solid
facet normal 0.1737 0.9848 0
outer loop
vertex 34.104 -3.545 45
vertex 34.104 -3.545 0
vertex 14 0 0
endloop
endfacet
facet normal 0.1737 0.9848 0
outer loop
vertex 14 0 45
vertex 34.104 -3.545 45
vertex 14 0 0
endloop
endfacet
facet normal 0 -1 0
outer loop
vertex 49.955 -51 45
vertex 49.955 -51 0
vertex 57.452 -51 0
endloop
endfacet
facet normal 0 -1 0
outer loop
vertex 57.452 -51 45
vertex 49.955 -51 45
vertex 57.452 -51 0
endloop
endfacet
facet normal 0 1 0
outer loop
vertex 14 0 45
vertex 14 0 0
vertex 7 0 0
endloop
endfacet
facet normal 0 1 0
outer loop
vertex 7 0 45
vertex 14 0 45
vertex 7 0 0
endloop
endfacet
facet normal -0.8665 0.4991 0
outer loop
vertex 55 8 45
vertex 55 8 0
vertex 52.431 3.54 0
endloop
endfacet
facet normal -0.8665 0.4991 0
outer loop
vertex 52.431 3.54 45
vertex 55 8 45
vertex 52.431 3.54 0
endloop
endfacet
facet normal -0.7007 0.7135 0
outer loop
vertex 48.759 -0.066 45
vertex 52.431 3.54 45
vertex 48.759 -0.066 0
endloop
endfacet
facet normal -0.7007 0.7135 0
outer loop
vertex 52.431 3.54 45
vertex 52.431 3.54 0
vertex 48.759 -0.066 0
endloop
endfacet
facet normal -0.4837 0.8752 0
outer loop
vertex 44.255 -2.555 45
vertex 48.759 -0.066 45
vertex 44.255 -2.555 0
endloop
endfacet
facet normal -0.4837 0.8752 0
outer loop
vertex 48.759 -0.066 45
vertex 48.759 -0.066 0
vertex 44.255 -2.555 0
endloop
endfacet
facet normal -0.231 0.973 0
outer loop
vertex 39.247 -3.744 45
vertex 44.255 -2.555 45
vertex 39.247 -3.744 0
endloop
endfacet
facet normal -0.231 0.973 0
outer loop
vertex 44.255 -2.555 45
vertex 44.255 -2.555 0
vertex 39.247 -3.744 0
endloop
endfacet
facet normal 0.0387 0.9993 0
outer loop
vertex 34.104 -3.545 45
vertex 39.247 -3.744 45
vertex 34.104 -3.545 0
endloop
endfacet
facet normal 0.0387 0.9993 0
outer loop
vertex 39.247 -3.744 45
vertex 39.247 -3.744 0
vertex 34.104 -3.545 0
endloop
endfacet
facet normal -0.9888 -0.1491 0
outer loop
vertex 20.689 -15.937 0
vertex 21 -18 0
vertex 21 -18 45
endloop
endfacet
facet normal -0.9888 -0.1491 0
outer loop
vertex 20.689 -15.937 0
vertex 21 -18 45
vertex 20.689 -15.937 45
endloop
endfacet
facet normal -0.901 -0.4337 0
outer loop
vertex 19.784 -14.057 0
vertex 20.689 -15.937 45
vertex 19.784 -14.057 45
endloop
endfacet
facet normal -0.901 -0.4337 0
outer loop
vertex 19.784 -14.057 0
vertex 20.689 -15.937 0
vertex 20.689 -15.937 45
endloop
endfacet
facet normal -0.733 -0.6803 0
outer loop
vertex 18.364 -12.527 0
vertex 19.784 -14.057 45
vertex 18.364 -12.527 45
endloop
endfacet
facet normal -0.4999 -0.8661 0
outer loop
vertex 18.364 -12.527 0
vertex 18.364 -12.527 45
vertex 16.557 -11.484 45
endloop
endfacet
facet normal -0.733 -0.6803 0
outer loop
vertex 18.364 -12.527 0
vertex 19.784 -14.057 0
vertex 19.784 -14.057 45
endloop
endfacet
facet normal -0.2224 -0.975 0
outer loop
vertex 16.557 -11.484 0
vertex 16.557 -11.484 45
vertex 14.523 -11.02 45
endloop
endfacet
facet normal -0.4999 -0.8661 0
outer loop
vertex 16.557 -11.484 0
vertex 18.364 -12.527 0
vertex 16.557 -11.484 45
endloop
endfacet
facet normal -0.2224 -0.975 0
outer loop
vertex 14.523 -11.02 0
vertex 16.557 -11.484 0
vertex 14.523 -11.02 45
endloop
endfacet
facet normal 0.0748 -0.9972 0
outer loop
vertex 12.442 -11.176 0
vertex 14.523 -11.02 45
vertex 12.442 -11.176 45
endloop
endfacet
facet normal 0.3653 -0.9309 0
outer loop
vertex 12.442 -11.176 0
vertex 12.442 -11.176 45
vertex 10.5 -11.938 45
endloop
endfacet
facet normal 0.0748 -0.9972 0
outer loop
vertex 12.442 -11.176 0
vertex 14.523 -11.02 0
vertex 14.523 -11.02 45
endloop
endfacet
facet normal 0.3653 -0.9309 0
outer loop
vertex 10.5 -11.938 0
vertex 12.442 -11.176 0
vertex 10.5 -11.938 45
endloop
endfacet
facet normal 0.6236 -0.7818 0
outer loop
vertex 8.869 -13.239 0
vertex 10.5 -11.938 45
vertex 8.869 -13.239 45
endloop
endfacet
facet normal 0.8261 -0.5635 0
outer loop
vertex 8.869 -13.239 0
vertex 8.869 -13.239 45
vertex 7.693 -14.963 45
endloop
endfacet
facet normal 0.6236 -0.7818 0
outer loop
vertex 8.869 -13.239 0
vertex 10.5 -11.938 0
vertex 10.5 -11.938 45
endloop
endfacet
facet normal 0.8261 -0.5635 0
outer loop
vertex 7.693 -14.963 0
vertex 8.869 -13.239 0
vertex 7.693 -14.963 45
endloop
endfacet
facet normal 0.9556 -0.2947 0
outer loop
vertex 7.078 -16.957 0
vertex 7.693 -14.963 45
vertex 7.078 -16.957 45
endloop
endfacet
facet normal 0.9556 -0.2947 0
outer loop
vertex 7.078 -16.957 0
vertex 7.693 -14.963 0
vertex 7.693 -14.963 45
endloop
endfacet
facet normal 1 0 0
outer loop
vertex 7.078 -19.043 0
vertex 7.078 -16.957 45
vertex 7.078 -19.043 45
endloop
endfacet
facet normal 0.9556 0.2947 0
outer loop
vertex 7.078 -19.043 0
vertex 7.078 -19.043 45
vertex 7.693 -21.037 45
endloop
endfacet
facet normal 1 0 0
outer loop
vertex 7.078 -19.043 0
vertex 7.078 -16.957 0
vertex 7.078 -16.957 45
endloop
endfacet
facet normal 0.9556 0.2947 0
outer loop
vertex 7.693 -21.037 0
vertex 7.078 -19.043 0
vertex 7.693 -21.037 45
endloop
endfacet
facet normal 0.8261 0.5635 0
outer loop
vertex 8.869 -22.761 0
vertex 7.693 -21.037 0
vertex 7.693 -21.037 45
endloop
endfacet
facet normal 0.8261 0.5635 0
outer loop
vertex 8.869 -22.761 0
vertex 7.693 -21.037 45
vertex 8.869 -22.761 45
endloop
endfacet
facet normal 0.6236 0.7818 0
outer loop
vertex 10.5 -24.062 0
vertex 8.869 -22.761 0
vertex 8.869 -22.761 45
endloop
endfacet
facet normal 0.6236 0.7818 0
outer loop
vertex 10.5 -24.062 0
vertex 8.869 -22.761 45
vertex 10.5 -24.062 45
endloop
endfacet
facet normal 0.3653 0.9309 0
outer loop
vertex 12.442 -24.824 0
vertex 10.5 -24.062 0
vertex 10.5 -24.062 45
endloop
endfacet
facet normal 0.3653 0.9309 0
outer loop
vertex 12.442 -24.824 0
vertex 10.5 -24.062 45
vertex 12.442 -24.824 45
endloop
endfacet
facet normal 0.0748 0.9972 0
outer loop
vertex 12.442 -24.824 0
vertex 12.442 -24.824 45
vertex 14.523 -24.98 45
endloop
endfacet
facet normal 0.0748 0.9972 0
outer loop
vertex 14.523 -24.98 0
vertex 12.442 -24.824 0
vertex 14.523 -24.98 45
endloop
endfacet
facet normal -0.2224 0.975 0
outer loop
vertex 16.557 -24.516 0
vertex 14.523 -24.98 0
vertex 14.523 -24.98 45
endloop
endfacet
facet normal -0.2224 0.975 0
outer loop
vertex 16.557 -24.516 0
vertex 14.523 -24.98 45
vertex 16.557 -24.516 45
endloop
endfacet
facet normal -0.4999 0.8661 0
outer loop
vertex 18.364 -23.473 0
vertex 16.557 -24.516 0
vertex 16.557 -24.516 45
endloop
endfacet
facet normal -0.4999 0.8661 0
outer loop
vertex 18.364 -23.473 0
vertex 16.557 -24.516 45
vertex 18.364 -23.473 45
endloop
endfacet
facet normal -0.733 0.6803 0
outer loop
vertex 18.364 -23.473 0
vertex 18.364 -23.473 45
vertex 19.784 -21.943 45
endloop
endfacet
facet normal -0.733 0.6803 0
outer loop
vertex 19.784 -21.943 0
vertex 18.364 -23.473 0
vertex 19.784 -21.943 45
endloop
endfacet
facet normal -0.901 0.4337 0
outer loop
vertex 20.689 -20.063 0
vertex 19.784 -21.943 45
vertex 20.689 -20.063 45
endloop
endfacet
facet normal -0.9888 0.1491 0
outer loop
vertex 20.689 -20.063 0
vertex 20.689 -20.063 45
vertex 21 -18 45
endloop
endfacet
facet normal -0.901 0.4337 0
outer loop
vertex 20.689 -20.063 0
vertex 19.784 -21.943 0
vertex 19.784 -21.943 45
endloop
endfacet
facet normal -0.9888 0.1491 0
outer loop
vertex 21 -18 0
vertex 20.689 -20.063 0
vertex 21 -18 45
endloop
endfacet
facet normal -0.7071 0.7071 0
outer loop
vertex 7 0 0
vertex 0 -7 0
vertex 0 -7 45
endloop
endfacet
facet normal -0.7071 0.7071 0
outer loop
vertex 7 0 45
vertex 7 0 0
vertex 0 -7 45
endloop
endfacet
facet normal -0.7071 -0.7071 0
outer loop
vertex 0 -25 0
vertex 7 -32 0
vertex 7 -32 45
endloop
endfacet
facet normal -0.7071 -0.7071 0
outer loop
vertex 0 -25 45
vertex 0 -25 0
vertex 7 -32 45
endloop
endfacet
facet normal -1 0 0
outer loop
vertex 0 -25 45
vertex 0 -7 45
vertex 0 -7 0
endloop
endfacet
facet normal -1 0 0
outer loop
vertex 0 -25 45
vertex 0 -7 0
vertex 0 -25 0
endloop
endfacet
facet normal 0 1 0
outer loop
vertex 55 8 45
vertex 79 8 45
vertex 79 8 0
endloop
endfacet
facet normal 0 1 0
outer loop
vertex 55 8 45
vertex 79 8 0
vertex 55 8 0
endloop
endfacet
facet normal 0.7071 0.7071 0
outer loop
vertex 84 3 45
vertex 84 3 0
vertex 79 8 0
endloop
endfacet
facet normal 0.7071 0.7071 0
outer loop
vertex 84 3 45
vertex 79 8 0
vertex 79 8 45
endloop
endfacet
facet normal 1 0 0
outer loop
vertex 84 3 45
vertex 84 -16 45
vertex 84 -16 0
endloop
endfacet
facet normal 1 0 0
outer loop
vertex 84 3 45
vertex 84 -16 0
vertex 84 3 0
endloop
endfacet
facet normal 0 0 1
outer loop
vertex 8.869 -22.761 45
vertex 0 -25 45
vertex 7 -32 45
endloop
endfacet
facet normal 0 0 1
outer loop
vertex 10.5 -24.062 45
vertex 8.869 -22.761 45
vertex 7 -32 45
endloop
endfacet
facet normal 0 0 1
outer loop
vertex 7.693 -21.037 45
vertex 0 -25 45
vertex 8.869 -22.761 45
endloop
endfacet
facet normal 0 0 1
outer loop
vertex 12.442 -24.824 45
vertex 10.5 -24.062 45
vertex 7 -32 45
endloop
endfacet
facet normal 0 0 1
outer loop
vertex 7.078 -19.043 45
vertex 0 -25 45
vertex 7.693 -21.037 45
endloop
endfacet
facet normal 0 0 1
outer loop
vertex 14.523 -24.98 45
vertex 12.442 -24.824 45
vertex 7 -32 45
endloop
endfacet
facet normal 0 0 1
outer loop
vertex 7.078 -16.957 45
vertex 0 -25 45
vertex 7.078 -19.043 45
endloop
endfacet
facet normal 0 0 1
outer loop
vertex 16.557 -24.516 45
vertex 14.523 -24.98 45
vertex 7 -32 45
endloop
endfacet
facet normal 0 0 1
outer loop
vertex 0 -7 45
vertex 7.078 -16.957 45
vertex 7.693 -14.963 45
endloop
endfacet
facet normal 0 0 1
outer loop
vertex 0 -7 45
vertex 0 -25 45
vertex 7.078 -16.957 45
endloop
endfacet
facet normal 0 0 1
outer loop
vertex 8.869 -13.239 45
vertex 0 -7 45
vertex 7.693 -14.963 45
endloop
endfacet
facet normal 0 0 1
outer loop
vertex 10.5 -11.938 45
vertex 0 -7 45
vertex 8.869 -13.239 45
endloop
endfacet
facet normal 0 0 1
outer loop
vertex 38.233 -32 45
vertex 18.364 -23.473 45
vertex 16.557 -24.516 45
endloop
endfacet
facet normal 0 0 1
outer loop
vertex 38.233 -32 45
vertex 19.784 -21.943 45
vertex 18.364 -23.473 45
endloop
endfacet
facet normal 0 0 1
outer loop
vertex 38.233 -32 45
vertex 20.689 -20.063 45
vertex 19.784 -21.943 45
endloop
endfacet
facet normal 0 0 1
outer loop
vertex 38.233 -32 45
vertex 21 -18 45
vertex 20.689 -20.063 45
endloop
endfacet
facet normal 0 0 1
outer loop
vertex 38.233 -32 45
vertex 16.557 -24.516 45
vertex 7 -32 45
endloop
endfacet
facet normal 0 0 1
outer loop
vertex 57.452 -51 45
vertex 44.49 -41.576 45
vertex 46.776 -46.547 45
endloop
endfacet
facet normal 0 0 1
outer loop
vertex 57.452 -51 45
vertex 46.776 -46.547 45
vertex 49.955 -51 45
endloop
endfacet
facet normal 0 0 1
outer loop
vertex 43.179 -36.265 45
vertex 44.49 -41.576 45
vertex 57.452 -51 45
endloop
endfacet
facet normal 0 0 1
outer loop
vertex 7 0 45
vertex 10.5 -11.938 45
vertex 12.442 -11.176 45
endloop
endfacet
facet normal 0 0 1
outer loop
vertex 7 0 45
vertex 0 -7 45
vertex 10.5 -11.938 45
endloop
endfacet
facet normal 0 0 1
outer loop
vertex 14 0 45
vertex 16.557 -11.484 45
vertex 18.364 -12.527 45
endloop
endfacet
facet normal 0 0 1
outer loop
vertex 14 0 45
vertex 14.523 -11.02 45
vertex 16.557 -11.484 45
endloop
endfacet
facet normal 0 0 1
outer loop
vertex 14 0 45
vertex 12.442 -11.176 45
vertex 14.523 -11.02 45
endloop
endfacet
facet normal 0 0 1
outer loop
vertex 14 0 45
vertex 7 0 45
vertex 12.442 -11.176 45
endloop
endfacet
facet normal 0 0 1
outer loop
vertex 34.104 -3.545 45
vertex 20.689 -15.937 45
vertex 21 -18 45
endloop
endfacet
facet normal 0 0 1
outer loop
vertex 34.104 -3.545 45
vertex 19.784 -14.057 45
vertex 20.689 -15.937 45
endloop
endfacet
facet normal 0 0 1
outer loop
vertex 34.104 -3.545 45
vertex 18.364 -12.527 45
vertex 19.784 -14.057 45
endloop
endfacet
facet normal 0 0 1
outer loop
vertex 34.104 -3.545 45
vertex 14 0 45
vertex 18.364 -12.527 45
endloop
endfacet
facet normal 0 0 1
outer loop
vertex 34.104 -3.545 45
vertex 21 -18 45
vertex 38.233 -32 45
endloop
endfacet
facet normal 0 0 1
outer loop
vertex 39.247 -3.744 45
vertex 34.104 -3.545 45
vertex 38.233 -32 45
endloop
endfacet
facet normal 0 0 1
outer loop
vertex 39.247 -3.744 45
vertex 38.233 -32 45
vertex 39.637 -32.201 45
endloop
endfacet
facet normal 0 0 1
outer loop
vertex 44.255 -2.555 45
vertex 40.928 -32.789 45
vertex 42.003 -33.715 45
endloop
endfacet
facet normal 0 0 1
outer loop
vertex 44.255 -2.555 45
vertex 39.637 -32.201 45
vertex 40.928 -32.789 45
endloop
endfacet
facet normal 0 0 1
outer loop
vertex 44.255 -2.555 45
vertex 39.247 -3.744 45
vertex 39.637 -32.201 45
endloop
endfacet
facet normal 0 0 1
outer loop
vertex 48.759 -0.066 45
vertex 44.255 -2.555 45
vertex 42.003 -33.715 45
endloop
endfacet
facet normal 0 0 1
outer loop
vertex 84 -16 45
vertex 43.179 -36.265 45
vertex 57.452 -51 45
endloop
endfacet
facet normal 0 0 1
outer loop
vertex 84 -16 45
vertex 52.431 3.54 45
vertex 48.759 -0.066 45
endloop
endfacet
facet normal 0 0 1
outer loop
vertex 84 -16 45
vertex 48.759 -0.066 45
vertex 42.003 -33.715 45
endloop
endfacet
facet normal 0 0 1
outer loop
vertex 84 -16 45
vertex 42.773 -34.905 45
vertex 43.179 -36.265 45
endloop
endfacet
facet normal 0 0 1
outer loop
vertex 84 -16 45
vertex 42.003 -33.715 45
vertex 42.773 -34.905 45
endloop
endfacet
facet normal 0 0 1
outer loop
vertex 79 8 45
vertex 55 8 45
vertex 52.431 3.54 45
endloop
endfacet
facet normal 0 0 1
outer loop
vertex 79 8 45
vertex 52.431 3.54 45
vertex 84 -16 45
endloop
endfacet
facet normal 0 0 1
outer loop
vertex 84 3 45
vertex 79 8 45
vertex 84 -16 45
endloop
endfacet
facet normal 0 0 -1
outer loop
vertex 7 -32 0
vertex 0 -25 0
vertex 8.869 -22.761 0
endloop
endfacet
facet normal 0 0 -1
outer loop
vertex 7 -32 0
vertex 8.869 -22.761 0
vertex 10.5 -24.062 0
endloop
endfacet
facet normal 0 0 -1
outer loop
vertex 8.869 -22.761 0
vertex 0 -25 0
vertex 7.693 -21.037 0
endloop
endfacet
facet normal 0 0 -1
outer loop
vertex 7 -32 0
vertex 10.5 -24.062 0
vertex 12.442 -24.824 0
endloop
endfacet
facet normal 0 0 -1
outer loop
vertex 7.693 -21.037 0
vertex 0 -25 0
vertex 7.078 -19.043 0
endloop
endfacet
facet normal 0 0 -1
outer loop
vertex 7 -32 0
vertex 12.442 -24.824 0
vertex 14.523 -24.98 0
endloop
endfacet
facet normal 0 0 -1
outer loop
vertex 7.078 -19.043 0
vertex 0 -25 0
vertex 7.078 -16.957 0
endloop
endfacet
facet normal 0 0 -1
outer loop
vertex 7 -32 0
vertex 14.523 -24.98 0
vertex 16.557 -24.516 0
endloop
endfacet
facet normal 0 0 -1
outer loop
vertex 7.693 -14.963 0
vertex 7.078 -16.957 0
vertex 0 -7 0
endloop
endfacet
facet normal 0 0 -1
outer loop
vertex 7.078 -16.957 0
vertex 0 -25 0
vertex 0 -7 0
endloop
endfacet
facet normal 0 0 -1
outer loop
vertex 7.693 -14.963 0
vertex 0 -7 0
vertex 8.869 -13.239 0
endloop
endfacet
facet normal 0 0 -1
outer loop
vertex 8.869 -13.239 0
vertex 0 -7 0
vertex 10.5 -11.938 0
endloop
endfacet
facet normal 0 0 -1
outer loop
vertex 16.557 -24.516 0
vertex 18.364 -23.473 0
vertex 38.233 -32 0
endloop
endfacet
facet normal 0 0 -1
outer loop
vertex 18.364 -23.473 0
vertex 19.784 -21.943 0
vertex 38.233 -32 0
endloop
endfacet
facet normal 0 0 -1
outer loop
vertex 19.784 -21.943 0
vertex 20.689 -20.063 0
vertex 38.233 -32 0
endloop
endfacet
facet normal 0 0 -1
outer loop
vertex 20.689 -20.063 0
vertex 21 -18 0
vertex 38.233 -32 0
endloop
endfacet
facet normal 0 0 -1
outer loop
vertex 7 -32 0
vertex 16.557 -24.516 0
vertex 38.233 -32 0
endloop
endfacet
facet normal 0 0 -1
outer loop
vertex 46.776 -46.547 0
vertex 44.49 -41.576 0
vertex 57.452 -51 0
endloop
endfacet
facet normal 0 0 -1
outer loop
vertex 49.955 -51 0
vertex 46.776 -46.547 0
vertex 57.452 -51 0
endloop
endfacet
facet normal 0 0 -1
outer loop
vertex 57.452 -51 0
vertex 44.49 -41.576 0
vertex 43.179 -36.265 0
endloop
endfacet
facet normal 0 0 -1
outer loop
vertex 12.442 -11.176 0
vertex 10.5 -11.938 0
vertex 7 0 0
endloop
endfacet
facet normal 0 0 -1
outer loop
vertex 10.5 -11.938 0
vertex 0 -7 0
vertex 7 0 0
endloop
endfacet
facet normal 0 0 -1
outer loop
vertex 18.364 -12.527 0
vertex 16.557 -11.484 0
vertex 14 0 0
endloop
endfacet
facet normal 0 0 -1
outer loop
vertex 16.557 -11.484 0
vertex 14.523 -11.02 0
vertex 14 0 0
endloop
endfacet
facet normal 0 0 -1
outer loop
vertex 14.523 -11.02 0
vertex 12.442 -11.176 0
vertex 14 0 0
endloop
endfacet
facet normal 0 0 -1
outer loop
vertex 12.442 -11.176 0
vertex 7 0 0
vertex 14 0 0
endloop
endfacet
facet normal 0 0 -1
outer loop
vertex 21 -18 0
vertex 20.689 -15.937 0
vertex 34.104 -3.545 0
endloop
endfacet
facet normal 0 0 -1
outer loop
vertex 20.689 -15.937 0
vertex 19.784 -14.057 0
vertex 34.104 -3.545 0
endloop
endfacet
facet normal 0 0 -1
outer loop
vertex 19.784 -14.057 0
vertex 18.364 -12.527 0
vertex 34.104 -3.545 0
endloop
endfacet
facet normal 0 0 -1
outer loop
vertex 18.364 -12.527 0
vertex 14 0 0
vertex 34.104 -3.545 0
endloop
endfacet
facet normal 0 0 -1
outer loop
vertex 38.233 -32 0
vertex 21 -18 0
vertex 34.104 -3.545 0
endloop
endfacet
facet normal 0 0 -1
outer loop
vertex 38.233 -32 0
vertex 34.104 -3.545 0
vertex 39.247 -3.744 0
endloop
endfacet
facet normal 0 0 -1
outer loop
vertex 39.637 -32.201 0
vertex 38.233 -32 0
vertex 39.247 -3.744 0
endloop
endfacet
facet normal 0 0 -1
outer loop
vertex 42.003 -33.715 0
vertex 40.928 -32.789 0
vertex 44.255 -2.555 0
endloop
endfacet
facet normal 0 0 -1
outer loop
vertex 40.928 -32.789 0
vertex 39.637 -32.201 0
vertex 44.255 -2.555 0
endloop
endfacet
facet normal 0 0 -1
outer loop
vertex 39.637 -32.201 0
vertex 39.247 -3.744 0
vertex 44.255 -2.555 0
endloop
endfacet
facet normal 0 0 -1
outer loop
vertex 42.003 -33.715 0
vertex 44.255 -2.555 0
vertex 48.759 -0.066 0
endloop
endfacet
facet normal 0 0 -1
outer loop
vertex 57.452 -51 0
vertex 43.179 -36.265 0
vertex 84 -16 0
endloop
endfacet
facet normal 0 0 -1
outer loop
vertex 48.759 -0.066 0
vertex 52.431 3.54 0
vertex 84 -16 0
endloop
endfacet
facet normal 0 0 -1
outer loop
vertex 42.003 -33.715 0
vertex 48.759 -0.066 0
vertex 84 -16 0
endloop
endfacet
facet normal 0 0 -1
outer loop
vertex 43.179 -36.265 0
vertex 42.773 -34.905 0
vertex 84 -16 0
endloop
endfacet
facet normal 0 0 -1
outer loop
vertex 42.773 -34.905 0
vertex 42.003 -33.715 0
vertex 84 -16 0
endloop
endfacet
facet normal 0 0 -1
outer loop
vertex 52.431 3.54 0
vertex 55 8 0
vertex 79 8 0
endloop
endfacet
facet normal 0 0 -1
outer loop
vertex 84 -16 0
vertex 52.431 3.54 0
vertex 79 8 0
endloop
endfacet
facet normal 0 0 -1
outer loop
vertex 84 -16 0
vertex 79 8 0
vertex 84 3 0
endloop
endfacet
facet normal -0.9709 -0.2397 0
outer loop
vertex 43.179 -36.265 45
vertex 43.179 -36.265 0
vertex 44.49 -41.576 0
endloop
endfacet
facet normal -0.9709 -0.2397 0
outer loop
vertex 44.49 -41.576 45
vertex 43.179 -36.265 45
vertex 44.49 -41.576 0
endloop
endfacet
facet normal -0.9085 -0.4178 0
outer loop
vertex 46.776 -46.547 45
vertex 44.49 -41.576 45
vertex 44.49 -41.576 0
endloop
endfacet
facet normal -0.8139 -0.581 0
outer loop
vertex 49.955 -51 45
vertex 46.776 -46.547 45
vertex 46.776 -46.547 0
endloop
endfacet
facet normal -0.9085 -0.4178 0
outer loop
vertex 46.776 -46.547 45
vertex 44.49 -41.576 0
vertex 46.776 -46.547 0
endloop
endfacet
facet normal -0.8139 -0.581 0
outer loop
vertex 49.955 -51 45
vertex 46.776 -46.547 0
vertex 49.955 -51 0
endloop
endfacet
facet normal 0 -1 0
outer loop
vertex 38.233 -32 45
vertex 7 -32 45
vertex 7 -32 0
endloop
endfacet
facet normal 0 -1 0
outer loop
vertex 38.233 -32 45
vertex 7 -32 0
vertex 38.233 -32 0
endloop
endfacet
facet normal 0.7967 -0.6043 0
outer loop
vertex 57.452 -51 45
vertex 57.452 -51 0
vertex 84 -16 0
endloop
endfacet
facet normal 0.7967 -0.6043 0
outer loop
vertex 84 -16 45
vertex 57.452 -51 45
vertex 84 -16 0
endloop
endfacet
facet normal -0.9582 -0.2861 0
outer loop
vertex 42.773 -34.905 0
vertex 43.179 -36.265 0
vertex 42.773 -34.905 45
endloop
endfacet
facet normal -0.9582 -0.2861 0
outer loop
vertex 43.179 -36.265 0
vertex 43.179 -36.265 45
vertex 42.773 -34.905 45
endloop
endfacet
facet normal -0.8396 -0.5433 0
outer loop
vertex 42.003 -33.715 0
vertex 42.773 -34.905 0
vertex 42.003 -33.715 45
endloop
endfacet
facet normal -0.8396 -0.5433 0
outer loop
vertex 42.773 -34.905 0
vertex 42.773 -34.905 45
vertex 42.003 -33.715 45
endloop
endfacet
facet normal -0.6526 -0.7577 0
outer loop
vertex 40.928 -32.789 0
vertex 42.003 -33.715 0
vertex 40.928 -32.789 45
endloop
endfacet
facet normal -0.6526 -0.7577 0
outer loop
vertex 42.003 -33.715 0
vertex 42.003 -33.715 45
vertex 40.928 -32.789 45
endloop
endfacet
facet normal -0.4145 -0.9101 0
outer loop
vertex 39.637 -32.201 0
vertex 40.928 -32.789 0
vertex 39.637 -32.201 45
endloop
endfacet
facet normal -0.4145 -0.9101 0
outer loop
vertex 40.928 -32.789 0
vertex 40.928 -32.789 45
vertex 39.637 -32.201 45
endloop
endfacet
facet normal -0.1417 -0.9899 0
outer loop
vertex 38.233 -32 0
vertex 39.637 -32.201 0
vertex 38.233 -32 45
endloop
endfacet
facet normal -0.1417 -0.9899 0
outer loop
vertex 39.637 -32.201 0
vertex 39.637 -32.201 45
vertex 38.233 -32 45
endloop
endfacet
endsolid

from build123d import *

# Parameters (mm, degrees)
SKETCH1_R           = 7
BOSS_EXTRUDE1_DEPTH = 45
CHAMFER1_SIZE       = 7
CHAMFER2_SIZE       = 7
CHAMFER3_SIZE       = 5
FILLET1_R           = 5


with BuildPart() as part:
    # Sketch1 → Boss-Extrude1 (new body)
    with BuildSketch(Plane.XY):
        with BuildLine():
            Line((14, 0), (0, 0))
            Line((0, 0), (0, -32))
            Line((0, -32), (42.863608631, -32))
            ThreePointArc((42.863608631, -32), (44.694157304, -42.140064899), (49.954706191, -51))
            Line((49.954706191, -51), (57.451644827, -51))
            Line((57.451644827, -51), (84, -16))
            Line((84, -16), (84, 8))
            Line((84, 8), (55, 8))
            ThreePointArc((55, 8), (46.591637328, -1.464097542), (34.104042352, -3.544885088))
            Line((34.104042352, -3.544885088), (14, 0))
        make_face()
        with Locations((14, -18)):
            Circle(SKETCH1_R, mode=Mode.SUBTRACT)
    extrude(amount=BOSS_EXTRUDE1_DEPTH)

    # Chamfer1
    chamfer1_edges = [part.edges().sort_by_distance(p)[0] for p in [
        (0, 0, 22.5),
    ]]
    chamfer(chamfer1_edges, length=CHAMFER1_SIZE)

    # Chamfer2
    chamfer2_edges = [part.edges().sort_by_distance(p)[0] for p in [
        (0, -32, 22.5),
    ]]
    chamfer(chamfer2_edges, length=CHAMFER2_SIZE)

    # Chamfer3
    chamfer3_edges = [part.edges().sort_by_distance(p)[0] for p in [
        (84, 8, 22.5),
    ]]
    chamfer(chamfer3_edges, length=CHAMFER3_SIZE)

    # Fillet1
    fillet1_edges = [part.edges().sort_by_distance(p)[0] for p in [
        (42.863608631, -32, 22.5),
    ]]
    fillet(fillet1_edges, radius=FILLET1_R)


solid = part.part
